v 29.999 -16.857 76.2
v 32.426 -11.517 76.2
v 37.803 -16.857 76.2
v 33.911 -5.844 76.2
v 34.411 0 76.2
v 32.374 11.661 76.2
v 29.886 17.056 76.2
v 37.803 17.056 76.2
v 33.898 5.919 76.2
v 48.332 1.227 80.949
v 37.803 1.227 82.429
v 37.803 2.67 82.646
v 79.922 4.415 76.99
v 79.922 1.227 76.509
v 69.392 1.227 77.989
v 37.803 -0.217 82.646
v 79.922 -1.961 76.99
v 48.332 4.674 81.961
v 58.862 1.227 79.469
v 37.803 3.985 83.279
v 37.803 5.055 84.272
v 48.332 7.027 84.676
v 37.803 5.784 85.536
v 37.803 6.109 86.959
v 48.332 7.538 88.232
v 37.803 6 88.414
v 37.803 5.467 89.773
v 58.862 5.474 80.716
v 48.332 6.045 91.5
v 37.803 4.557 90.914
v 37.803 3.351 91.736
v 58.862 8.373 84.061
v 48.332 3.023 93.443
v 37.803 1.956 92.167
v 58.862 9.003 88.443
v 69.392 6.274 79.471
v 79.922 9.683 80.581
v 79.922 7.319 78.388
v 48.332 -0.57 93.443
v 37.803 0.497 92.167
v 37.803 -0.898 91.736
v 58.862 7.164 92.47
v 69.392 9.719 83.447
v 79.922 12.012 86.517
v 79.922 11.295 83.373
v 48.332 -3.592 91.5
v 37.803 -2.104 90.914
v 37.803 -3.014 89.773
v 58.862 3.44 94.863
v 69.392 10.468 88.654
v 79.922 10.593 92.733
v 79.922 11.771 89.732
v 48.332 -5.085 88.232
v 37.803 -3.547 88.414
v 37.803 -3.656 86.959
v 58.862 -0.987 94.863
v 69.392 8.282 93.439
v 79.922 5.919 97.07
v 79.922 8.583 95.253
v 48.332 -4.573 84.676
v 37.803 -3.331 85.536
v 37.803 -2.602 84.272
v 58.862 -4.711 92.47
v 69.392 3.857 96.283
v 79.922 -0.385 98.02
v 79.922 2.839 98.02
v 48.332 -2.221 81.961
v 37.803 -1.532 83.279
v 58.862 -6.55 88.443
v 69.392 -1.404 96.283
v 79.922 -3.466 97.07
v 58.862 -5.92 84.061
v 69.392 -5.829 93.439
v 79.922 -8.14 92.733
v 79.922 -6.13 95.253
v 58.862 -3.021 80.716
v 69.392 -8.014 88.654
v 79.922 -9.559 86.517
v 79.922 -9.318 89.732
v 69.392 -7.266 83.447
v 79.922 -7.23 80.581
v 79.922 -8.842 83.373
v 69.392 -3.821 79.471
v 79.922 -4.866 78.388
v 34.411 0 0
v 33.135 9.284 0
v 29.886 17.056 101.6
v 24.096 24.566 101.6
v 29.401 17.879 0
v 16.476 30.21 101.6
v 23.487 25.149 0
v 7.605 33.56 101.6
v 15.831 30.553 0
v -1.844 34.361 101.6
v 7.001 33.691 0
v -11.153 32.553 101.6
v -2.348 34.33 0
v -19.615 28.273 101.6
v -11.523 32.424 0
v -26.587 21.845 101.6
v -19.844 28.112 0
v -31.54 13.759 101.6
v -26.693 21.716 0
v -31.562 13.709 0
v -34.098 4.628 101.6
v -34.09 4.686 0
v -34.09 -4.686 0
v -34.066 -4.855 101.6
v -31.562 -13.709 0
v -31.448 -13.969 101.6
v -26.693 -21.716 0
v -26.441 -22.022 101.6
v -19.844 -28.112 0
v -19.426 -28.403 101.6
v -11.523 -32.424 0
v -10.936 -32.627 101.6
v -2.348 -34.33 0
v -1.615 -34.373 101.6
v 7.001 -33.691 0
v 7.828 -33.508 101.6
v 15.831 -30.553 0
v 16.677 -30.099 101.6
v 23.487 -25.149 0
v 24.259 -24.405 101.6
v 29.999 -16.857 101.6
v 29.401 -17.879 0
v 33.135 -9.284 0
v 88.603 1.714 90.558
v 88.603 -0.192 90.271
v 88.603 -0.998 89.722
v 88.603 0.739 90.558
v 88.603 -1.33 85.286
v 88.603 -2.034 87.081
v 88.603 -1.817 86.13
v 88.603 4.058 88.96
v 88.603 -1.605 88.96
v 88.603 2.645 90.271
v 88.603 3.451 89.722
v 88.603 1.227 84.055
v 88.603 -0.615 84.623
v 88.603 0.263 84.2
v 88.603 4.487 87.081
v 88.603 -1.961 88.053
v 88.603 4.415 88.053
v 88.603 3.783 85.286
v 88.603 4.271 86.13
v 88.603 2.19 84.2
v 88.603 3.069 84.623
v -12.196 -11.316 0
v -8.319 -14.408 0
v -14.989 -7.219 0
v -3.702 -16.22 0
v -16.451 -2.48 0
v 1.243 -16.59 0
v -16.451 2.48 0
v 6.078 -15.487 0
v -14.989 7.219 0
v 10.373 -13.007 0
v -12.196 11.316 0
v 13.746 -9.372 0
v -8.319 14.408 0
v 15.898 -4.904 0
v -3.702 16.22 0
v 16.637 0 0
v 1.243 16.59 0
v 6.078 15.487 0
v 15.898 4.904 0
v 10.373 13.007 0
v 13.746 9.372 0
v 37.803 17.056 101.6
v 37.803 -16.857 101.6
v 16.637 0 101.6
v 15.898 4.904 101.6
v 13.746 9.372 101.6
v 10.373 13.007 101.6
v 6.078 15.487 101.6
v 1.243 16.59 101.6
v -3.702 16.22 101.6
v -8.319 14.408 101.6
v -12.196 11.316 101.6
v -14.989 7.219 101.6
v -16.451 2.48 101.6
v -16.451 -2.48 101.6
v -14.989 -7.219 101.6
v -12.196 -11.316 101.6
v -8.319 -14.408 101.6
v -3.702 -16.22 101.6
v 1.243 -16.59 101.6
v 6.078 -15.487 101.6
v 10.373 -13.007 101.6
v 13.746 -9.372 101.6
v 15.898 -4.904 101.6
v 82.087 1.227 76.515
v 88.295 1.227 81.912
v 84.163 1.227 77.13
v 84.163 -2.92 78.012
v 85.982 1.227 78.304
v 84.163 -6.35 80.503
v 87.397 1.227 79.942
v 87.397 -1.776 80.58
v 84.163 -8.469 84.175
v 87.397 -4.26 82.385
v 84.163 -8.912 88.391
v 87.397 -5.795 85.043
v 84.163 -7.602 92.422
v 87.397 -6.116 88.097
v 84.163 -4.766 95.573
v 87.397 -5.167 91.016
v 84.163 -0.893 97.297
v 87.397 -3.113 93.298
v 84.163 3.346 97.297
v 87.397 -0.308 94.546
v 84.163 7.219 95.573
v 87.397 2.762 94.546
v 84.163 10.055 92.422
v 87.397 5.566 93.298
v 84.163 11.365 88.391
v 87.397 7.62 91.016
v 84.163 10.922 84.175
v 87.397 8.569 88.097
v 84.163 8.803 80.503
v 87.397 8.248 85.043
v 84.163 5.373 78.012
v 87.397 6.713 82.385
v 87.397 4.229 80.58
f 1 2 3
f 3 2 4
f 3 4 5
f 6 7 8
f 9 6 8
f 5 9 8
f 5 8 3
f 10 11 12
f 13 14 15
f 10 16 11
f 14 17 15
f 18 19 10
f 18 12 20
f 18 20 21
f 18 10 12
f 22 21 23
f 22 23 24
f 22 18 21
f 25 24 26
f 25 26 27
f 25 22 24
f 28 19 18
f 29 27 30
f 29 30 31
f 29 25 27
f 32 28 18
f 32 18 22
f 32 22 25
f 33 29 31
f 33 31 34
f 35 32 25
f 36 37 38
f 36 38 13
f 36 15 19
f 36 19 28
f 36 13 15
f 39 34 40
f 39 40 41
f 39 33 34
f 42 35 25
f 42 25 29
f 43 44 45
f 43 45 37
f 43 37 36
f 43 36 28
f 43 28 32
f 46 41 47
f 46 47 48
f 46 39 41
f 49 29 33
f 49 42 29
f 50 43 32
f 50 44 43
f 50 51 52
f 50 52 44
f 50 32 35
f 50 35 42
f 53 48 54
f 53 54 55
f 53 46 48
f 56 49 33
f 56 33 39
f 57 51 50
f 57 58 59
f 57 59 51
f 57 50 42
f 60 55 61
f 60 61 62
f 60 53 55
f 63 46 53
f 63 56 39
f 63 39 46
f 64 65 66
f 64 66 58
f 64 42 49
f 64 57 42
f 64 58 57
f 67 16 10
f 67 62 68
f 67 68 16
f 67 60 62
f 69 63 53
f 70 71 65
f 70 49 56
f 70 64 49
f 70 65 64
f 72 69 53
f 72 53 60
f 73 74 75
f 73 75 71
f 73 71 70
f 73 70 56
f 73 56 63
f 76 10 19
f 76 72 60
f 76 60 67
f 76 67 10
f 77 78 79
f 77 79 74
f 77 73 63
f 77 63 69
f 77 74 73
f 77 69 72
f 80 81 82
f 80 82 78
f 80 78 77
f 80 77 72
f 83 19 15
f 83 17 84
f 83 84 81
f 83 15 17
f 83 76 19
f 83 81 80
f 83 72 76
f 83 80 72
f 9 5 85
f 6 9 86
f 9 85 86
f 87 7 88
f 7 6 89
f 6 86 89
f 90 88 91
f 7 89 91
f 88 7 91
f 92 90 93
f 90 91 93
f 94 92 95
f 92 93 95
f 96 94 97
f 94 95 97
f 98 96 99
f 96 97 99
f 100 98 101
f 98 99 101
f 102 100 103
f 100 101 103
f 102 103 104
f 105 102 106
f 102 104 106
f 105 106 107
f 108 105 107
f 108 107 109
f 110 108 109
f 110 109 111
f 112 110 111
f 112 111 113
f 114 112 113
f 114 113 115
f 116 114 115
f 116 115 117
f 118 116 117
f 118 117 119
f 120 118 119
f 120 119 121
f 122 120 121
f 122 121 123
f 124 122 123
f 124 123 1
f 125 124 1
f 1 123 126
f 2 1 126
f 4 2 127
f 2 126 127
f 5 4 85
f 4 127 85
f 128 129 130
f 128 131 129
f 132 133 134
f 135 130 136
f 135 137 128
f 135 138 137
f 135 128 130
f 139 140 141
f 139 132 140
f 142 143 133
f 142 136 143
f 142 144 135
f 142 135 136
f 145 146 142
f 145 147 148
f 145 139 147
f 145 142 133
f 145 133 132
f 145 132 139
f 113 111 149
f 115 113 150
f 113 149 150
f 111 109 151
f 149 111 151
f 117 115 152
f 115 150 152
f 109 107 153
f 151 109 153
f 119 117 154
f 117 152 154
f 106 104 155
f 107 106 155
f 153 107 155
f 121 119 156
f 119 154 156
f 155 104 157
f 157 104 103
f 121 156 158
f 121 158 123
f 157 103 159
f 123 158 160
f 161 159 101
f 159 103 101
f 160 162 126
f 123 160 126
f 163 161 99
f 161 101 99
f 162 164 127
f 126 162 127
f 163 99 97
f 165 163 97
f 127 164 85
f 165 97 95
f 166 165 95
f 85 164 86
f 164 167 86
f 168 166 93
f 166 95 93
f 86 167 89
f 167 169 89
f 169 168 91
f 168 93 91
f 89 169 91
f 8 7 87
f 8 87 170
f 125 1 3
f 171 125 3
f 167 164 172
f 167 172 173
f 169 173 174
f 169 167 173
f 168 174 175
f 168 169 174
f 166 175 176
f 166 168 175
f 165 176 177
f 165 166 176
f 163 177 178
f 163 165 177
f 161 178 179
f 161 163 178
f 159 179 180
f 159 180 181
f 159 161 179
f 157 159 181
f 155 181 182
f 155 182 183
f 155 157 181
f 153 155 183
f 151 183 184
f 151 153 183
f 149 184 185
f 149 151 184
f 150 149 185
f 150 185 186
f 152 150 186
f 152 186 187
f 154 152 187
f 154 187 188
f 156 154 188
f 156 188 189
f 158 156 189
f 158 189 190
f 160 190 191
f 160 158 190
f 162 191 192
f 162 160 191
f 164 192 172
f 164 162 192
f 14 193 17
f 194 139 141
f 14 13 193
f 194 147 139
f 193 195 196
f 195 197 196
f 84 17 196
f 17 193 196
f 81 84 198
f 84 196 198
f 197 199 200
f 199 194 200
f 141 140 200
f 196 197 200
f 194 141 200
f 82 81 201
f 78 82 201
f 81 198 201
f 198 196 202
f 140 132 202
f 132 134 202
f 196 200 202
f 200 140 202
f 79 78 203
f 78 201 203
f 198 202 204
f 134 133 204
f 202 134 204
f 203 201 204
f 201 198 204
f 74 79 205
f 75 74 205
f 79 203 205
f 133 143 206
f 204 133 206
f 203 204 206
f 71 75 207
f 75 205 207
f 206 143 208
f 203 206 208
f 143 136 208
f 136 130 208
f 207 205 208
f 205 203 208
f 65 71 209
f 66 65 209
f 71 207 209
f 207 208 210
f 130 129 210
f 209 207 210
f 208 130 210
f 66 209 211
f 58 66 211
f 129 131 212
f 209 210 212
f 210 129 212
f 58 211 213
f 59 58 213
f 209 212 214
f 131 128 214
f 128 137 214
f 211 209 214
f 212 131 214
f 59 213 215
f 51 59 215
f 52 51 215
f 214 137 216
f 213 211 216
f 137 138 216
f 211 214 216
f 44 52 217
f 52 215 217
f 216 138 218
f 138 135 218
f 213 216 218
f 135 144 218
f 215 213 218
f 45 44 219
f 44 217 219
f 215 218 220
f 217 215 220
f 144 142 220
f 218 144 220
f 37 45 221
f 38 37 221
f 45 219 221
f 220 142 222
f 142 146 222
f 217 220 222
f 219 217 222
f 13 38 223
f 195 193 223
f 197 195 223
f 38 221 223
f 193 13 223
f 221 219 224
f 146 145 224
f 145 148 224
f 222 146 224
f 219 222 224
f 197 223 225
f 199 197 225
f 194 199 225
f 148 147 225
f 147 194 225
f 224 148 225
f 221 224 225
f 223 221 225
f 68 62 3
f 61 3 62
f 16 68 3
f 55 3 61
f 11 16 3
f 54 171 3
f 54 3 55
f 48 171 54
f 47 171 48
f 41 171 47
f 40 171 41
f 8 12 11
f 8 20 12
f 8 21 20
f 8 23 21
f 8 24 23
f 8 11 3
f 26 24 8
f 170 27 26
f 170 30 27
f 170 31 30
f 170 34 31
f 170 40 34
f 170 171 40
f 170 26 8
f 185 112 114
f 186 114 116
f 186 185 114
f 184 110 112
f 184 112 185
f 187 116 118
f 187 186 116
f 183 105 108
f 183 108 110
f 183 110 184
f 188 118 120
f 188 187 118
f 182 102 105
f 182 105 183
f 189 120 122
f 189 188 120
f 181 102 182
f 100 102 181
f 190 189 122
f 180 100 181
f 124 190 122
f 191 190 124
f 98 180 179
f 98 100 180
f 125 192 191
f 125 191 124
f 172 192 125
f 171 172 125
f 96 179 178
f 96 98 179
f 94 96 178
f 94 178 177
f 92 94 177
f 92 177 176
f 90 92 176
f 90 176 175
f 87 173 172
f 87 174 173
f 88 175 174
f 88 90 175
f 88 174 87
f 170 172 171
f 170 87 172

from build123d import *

# Parameters (mm, degrees)
SKETCH2_R           = 34.410626859
SKETCH2_R_2         = 16.637
BOSS_EXTRUDE1_DEPTH = 101.6
SKETCH3_W           = 16.158329911
SKETCH3_H           = 33.912544257
BOSS_EXTRUDE2_DEPTH = 25.4
SKETCH4_R           = 4.896317789
BOSS_EXTRUDE3_DEPTH = 50.8
BOSS_EXTRUDE3_TAPER = -8
FILLET1_R           = 7.62


with BuildPart() as part:
    # Sketch2 → Boss-Extrude1 (new body)
    with BuildSketch(Plane.XY):
        Circle(SKETCH2_R)
        Circle(SKETCH2_R_2, mode=Mode.SUBTRACT)
    extrude(amount=BOSS_EXTRUDE1_DEPTH)

    # Sketch3 → Boss-Extrude2 (add)
    with BuildSketch(Plane.XY.offset(101.6)):
        with Locations((29.723347614, 0.099742777)):
            Rectangle(SKETCH3_W, SKETCH3_H)
    extrude(amount=-BOSS_EXTRUDE2_DEPTH)

    # Sketch4 → Boss-Extrude3 (add)
    with BuildSketch(Plane(origin=(37.802512569, 0, 0), x_dir=(0, 0, -1), z_dir=(1, 0, 0))):
        with Locations((-87.324916431, 1.22659491)):
            Circle(SKETCH4_R)
    extrude(amount=BOSS_EXTRUDE3_DEPTH, taper=BOSS_EXTRUDE3_TAPER)

    # Fillet1
    fillet1_edges = [part.edges().sort_by_distance(p)[0] for p in [
        (88.602512569, 1.22659491, 99.360708623),
    ]]
    fillet(fillet1_edges, radius=FILLET1_R)


solid = part.part
